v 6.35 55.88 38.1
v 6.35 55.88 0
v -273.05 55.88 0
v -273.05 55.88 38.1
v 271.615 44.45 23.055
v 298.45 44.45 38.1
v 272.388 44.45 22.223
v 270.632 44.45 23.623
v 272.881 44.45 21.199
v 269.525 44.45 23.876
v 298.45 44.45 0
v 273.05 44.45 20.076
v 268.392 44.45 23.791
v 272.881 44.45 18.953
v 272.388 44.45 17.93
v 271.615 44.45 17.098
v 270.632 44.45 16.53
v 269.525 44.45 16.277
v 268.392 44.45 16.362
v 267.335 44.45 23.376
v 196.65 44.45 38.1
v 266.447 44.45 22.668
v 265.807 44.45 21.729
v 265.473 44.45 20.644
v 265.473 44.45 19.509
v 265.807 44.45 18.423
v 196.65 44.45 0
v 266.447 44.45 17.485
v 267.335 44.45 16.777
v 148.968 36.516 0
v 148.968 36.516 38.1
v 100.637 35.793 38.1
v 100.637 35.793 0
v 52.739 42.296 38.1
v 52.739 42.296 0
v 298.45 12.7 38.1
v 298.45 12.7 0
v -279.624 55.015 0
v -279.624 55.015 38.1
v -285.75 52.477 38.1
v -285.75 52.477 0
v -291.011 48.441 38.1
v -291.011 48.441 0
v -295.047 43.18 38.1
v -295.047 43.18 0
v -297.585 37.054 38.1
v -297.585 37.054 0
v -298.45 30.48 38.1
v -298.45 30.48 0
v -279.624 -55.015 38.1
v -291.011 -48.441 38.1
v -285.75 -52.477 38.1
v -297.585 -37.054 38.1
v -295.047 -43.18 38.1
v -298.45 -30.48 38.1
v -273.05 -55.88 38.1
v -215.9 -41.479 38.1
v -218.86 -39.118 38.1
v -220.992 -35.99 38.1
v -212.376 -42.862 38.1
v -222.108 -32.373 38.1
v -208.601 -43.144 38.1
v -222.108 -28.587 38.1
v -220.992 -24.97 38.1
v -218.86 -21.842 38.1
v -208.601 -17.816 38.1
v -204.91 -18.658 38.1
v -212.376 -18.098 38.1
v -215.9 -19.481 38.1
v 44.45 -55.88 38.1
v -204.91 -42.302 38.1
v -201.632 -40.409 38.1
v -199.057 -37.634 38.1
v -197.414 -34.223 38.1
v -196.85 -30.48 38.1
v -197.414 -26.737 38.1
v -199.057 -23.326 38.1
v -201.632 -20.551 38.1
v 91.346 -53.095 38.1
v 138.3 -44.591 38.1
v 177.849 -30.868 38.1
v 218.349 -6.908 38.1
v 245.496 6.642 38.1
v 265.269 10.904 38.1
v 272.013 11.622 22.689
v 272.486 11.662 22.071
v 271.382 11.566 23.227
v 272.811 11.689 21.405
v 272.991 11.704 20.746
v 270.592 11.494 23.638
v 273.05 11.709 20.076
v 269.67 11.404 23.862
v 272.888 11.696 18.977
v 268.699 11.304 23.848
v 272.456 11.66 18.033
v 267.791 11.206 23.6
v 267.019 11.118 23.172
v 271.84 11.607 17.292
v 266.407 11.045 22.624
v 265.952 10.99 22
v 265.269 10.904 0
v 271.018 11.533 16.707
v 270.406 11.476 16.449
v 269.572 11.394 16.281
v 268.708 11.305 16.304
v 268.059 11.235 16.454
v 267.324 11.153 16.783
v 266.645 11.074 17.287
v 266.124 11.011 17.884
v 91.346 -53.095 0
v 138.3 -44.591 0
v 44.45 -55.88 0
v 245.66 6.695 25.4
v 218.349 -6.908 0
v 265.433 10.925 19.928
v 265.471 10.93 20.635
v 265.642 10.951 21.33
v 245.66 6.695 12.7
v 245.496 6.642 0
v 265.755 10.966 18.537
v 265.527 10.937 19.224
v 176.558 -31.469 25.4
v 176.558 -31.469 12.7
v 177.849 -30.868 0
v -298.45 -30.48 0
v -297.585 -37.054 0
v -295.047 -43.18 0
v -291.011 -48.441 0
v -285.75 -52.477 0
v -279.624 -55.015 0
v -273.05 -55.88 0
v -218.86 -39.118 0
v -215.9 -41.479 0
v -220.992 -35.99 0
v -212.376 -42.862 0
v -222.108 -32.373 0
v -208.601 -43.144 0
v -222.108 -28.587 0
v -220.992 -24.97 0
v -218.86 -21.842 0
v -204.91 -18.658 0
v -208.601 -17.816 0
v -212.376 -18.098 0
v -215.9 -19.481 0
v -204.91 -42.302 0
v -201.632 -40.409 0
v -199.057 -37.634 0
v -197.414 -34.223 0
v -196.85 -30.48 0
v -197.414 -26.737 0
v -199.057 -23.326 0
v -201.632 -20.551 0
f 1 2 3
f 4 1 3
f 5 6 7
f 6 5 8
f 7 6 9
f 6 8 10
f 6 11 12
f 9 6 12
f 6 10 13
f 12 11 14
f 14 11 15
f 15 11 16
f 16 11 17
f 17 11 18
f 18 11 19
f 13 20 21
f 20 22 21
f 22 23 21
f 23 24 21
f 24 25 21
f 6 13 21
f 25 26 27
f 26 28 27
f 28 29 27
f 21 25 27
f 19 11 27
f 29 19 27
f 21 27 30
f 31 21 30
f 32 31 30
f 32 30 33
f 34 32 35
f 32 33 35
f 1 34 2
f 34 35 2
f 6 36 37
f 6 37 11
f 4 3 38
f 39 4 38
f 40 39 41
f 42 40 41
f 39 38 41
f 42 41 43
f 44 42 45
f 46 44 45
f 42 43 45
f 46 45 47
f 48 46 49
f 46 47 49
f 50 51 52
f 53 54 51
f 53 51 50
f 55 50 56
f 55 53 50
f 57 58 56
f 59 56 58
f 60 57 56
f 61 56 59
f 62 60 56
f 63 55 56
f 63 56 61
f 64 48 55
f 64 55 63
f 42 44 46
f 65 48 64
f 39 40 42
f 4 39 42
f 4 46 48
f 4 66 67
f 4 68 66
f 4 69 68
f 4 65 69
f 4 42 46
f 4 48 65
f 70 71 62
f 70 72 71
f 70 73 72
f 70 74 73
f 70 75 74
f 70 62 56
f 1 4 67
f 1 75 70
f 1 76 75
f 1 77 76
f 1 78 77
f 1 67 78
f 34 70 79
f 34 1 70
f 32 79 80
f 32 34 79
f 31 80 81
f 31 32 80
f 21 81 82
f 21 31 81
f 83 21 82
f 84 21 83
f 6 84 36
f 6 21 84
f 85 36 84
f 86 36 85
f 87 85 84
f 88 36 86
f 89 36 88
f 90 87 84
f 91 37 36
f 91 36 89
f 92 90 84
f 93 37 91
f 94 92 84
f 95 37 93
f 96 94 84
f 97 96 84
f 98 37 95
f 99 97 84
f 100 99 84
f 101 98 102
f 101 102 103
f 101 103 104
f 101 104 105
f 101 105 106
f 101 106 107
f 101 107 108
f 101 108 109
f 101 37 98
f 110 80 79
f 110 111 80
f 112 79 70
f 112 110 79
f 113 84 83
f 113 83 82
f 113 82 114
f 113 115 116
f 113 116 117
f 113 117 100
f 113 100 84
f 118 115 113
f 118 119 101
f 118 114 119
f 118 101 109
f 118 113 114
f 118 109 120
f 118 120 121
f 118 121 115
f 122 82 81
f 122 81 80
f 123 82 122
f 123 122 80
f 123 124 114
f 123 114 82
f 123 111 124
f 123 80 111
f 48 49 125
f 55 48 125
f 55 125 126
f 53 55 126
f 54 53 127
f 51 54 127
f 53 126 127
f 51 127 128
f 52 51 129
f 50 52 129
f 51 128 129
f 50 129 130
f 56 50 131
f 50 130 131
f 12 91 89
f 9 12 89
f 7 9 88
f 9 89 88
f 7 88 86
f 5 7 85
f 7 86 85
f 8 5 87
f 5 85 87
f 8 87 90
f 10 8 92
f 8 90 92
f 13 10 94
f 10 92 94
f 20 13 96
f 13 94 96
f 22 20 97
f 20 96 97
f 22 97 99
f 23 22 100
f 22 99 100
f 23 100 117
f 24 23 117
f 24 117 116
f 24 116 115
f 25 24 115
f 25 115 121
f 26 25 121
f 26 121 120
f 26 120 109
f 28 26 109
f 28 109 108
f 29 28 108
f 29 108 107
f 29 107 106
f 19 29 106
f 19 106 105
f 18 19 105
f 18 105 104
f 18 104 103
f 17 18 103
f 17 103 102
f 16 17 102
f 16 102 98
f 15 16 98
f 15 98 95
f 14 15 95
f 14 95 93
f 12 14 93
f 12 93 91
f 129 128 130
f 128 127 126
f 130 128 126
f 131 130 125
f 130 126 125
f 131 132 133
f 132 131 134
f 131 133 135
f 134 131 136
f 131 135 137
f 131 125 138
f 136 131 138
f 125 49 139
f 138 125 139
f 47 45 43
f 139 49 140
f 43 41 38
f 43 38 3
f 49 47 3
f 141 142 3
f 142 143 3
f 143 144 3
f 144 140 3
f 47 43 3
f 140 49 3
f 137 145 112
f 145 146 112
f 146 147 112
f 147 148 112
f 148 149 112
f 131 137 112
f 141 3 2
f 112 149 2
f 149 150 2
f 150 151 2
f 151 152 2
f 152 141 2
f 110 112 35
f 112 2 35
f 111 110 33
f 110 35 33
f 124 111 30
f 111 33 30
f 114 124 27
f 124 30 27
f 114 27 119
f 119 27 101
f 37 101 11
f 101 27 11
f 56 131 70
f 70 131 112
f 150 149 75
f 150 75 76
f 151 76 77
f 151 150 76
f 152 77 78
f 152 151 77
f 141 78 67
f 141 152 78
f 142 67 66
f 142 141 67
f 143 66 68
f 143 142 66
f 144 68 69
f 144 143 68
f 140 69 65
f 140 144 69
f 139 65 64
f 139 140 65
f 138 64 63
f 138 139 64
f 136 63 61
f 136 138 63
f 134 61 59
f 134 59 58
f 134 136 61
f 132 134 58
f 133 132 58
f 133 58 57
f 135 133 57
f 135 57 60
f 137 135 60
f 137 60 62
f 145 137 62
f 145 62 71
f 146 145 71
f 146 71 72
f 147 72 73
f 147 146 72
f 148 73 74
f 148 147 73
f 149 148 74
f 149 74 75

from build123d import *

# Parameters (mm, degrees)
F0_R     = 12.7
F1_DEPTH = 38.1
F2_DEPTH = 38.1
F3_R     = 3.81
F4_DEPTH = 44.45


with BuildPart() as f1:
    # F0 (on Top) → F1 (new body)
    with BuildSketch(Plane.XY):
        with BuildLine():
            ThreePointArc((-298.45, -30.48), (-291.0105122421, -48.4405122421), (-273.05, -55.88))
            Line((-273.05, -55.88), (44.45, -55.88))
            add(Edge.make_bspline(
                [(298.45, 12.7), (287.3746065868, 12.2425019897), (237.2362744318, 13.75434495), (180.5553043181, -42.0538384419), (88.1868358472, -55.88), (44.45, -55.88)],
                knots=[0, 0, 0, 0, 0.2625301209, 0.5825371407, 1, 1, 1, 1], degree=3))
            Line((298.45, 12.7), (298.45, 44.45))
            Line((298.45, 44.45), (196.6498470859, 44.45))
            ThreePointArc((196.6498470859, 44.45), (100.6366870799, 35.7928419142), (6.35, 55.88))
            Line((6.35, 55.88), (-273.05, 55.88))
            ThreePointArc((-273.05, 55.88), (-291.0105122421, 48.4405122421), (-298.45, 30.48))
            Line((-298.45, 30.48), (-298.45, -30.48))
        make_face()
        with Locations((-209.55, -30.48)):
            Circle(F0_R, mode=Mode.SUBTRACT)
    extrude(amount=F1_DEPTH)

    # F0 (on Top) → F2 (cut)
    with BuildSketch(Plane.XY):
        with Locations((-209.55, -30.48)):
            Circle(F0_R)
    extrude(amount=F2_DEPTH, mode=Mode.SUBTRACT)

    # F3 (on Front) → F4 (cut)
    with BuildSketch(Plane.XZ):
        with Locations((269.24, 20.0763624161)):
            Circle(F3_R)
    extrude(amount=-F4_DEPTH, mode=Mode.SUBTRACT)


solid = f1.part
